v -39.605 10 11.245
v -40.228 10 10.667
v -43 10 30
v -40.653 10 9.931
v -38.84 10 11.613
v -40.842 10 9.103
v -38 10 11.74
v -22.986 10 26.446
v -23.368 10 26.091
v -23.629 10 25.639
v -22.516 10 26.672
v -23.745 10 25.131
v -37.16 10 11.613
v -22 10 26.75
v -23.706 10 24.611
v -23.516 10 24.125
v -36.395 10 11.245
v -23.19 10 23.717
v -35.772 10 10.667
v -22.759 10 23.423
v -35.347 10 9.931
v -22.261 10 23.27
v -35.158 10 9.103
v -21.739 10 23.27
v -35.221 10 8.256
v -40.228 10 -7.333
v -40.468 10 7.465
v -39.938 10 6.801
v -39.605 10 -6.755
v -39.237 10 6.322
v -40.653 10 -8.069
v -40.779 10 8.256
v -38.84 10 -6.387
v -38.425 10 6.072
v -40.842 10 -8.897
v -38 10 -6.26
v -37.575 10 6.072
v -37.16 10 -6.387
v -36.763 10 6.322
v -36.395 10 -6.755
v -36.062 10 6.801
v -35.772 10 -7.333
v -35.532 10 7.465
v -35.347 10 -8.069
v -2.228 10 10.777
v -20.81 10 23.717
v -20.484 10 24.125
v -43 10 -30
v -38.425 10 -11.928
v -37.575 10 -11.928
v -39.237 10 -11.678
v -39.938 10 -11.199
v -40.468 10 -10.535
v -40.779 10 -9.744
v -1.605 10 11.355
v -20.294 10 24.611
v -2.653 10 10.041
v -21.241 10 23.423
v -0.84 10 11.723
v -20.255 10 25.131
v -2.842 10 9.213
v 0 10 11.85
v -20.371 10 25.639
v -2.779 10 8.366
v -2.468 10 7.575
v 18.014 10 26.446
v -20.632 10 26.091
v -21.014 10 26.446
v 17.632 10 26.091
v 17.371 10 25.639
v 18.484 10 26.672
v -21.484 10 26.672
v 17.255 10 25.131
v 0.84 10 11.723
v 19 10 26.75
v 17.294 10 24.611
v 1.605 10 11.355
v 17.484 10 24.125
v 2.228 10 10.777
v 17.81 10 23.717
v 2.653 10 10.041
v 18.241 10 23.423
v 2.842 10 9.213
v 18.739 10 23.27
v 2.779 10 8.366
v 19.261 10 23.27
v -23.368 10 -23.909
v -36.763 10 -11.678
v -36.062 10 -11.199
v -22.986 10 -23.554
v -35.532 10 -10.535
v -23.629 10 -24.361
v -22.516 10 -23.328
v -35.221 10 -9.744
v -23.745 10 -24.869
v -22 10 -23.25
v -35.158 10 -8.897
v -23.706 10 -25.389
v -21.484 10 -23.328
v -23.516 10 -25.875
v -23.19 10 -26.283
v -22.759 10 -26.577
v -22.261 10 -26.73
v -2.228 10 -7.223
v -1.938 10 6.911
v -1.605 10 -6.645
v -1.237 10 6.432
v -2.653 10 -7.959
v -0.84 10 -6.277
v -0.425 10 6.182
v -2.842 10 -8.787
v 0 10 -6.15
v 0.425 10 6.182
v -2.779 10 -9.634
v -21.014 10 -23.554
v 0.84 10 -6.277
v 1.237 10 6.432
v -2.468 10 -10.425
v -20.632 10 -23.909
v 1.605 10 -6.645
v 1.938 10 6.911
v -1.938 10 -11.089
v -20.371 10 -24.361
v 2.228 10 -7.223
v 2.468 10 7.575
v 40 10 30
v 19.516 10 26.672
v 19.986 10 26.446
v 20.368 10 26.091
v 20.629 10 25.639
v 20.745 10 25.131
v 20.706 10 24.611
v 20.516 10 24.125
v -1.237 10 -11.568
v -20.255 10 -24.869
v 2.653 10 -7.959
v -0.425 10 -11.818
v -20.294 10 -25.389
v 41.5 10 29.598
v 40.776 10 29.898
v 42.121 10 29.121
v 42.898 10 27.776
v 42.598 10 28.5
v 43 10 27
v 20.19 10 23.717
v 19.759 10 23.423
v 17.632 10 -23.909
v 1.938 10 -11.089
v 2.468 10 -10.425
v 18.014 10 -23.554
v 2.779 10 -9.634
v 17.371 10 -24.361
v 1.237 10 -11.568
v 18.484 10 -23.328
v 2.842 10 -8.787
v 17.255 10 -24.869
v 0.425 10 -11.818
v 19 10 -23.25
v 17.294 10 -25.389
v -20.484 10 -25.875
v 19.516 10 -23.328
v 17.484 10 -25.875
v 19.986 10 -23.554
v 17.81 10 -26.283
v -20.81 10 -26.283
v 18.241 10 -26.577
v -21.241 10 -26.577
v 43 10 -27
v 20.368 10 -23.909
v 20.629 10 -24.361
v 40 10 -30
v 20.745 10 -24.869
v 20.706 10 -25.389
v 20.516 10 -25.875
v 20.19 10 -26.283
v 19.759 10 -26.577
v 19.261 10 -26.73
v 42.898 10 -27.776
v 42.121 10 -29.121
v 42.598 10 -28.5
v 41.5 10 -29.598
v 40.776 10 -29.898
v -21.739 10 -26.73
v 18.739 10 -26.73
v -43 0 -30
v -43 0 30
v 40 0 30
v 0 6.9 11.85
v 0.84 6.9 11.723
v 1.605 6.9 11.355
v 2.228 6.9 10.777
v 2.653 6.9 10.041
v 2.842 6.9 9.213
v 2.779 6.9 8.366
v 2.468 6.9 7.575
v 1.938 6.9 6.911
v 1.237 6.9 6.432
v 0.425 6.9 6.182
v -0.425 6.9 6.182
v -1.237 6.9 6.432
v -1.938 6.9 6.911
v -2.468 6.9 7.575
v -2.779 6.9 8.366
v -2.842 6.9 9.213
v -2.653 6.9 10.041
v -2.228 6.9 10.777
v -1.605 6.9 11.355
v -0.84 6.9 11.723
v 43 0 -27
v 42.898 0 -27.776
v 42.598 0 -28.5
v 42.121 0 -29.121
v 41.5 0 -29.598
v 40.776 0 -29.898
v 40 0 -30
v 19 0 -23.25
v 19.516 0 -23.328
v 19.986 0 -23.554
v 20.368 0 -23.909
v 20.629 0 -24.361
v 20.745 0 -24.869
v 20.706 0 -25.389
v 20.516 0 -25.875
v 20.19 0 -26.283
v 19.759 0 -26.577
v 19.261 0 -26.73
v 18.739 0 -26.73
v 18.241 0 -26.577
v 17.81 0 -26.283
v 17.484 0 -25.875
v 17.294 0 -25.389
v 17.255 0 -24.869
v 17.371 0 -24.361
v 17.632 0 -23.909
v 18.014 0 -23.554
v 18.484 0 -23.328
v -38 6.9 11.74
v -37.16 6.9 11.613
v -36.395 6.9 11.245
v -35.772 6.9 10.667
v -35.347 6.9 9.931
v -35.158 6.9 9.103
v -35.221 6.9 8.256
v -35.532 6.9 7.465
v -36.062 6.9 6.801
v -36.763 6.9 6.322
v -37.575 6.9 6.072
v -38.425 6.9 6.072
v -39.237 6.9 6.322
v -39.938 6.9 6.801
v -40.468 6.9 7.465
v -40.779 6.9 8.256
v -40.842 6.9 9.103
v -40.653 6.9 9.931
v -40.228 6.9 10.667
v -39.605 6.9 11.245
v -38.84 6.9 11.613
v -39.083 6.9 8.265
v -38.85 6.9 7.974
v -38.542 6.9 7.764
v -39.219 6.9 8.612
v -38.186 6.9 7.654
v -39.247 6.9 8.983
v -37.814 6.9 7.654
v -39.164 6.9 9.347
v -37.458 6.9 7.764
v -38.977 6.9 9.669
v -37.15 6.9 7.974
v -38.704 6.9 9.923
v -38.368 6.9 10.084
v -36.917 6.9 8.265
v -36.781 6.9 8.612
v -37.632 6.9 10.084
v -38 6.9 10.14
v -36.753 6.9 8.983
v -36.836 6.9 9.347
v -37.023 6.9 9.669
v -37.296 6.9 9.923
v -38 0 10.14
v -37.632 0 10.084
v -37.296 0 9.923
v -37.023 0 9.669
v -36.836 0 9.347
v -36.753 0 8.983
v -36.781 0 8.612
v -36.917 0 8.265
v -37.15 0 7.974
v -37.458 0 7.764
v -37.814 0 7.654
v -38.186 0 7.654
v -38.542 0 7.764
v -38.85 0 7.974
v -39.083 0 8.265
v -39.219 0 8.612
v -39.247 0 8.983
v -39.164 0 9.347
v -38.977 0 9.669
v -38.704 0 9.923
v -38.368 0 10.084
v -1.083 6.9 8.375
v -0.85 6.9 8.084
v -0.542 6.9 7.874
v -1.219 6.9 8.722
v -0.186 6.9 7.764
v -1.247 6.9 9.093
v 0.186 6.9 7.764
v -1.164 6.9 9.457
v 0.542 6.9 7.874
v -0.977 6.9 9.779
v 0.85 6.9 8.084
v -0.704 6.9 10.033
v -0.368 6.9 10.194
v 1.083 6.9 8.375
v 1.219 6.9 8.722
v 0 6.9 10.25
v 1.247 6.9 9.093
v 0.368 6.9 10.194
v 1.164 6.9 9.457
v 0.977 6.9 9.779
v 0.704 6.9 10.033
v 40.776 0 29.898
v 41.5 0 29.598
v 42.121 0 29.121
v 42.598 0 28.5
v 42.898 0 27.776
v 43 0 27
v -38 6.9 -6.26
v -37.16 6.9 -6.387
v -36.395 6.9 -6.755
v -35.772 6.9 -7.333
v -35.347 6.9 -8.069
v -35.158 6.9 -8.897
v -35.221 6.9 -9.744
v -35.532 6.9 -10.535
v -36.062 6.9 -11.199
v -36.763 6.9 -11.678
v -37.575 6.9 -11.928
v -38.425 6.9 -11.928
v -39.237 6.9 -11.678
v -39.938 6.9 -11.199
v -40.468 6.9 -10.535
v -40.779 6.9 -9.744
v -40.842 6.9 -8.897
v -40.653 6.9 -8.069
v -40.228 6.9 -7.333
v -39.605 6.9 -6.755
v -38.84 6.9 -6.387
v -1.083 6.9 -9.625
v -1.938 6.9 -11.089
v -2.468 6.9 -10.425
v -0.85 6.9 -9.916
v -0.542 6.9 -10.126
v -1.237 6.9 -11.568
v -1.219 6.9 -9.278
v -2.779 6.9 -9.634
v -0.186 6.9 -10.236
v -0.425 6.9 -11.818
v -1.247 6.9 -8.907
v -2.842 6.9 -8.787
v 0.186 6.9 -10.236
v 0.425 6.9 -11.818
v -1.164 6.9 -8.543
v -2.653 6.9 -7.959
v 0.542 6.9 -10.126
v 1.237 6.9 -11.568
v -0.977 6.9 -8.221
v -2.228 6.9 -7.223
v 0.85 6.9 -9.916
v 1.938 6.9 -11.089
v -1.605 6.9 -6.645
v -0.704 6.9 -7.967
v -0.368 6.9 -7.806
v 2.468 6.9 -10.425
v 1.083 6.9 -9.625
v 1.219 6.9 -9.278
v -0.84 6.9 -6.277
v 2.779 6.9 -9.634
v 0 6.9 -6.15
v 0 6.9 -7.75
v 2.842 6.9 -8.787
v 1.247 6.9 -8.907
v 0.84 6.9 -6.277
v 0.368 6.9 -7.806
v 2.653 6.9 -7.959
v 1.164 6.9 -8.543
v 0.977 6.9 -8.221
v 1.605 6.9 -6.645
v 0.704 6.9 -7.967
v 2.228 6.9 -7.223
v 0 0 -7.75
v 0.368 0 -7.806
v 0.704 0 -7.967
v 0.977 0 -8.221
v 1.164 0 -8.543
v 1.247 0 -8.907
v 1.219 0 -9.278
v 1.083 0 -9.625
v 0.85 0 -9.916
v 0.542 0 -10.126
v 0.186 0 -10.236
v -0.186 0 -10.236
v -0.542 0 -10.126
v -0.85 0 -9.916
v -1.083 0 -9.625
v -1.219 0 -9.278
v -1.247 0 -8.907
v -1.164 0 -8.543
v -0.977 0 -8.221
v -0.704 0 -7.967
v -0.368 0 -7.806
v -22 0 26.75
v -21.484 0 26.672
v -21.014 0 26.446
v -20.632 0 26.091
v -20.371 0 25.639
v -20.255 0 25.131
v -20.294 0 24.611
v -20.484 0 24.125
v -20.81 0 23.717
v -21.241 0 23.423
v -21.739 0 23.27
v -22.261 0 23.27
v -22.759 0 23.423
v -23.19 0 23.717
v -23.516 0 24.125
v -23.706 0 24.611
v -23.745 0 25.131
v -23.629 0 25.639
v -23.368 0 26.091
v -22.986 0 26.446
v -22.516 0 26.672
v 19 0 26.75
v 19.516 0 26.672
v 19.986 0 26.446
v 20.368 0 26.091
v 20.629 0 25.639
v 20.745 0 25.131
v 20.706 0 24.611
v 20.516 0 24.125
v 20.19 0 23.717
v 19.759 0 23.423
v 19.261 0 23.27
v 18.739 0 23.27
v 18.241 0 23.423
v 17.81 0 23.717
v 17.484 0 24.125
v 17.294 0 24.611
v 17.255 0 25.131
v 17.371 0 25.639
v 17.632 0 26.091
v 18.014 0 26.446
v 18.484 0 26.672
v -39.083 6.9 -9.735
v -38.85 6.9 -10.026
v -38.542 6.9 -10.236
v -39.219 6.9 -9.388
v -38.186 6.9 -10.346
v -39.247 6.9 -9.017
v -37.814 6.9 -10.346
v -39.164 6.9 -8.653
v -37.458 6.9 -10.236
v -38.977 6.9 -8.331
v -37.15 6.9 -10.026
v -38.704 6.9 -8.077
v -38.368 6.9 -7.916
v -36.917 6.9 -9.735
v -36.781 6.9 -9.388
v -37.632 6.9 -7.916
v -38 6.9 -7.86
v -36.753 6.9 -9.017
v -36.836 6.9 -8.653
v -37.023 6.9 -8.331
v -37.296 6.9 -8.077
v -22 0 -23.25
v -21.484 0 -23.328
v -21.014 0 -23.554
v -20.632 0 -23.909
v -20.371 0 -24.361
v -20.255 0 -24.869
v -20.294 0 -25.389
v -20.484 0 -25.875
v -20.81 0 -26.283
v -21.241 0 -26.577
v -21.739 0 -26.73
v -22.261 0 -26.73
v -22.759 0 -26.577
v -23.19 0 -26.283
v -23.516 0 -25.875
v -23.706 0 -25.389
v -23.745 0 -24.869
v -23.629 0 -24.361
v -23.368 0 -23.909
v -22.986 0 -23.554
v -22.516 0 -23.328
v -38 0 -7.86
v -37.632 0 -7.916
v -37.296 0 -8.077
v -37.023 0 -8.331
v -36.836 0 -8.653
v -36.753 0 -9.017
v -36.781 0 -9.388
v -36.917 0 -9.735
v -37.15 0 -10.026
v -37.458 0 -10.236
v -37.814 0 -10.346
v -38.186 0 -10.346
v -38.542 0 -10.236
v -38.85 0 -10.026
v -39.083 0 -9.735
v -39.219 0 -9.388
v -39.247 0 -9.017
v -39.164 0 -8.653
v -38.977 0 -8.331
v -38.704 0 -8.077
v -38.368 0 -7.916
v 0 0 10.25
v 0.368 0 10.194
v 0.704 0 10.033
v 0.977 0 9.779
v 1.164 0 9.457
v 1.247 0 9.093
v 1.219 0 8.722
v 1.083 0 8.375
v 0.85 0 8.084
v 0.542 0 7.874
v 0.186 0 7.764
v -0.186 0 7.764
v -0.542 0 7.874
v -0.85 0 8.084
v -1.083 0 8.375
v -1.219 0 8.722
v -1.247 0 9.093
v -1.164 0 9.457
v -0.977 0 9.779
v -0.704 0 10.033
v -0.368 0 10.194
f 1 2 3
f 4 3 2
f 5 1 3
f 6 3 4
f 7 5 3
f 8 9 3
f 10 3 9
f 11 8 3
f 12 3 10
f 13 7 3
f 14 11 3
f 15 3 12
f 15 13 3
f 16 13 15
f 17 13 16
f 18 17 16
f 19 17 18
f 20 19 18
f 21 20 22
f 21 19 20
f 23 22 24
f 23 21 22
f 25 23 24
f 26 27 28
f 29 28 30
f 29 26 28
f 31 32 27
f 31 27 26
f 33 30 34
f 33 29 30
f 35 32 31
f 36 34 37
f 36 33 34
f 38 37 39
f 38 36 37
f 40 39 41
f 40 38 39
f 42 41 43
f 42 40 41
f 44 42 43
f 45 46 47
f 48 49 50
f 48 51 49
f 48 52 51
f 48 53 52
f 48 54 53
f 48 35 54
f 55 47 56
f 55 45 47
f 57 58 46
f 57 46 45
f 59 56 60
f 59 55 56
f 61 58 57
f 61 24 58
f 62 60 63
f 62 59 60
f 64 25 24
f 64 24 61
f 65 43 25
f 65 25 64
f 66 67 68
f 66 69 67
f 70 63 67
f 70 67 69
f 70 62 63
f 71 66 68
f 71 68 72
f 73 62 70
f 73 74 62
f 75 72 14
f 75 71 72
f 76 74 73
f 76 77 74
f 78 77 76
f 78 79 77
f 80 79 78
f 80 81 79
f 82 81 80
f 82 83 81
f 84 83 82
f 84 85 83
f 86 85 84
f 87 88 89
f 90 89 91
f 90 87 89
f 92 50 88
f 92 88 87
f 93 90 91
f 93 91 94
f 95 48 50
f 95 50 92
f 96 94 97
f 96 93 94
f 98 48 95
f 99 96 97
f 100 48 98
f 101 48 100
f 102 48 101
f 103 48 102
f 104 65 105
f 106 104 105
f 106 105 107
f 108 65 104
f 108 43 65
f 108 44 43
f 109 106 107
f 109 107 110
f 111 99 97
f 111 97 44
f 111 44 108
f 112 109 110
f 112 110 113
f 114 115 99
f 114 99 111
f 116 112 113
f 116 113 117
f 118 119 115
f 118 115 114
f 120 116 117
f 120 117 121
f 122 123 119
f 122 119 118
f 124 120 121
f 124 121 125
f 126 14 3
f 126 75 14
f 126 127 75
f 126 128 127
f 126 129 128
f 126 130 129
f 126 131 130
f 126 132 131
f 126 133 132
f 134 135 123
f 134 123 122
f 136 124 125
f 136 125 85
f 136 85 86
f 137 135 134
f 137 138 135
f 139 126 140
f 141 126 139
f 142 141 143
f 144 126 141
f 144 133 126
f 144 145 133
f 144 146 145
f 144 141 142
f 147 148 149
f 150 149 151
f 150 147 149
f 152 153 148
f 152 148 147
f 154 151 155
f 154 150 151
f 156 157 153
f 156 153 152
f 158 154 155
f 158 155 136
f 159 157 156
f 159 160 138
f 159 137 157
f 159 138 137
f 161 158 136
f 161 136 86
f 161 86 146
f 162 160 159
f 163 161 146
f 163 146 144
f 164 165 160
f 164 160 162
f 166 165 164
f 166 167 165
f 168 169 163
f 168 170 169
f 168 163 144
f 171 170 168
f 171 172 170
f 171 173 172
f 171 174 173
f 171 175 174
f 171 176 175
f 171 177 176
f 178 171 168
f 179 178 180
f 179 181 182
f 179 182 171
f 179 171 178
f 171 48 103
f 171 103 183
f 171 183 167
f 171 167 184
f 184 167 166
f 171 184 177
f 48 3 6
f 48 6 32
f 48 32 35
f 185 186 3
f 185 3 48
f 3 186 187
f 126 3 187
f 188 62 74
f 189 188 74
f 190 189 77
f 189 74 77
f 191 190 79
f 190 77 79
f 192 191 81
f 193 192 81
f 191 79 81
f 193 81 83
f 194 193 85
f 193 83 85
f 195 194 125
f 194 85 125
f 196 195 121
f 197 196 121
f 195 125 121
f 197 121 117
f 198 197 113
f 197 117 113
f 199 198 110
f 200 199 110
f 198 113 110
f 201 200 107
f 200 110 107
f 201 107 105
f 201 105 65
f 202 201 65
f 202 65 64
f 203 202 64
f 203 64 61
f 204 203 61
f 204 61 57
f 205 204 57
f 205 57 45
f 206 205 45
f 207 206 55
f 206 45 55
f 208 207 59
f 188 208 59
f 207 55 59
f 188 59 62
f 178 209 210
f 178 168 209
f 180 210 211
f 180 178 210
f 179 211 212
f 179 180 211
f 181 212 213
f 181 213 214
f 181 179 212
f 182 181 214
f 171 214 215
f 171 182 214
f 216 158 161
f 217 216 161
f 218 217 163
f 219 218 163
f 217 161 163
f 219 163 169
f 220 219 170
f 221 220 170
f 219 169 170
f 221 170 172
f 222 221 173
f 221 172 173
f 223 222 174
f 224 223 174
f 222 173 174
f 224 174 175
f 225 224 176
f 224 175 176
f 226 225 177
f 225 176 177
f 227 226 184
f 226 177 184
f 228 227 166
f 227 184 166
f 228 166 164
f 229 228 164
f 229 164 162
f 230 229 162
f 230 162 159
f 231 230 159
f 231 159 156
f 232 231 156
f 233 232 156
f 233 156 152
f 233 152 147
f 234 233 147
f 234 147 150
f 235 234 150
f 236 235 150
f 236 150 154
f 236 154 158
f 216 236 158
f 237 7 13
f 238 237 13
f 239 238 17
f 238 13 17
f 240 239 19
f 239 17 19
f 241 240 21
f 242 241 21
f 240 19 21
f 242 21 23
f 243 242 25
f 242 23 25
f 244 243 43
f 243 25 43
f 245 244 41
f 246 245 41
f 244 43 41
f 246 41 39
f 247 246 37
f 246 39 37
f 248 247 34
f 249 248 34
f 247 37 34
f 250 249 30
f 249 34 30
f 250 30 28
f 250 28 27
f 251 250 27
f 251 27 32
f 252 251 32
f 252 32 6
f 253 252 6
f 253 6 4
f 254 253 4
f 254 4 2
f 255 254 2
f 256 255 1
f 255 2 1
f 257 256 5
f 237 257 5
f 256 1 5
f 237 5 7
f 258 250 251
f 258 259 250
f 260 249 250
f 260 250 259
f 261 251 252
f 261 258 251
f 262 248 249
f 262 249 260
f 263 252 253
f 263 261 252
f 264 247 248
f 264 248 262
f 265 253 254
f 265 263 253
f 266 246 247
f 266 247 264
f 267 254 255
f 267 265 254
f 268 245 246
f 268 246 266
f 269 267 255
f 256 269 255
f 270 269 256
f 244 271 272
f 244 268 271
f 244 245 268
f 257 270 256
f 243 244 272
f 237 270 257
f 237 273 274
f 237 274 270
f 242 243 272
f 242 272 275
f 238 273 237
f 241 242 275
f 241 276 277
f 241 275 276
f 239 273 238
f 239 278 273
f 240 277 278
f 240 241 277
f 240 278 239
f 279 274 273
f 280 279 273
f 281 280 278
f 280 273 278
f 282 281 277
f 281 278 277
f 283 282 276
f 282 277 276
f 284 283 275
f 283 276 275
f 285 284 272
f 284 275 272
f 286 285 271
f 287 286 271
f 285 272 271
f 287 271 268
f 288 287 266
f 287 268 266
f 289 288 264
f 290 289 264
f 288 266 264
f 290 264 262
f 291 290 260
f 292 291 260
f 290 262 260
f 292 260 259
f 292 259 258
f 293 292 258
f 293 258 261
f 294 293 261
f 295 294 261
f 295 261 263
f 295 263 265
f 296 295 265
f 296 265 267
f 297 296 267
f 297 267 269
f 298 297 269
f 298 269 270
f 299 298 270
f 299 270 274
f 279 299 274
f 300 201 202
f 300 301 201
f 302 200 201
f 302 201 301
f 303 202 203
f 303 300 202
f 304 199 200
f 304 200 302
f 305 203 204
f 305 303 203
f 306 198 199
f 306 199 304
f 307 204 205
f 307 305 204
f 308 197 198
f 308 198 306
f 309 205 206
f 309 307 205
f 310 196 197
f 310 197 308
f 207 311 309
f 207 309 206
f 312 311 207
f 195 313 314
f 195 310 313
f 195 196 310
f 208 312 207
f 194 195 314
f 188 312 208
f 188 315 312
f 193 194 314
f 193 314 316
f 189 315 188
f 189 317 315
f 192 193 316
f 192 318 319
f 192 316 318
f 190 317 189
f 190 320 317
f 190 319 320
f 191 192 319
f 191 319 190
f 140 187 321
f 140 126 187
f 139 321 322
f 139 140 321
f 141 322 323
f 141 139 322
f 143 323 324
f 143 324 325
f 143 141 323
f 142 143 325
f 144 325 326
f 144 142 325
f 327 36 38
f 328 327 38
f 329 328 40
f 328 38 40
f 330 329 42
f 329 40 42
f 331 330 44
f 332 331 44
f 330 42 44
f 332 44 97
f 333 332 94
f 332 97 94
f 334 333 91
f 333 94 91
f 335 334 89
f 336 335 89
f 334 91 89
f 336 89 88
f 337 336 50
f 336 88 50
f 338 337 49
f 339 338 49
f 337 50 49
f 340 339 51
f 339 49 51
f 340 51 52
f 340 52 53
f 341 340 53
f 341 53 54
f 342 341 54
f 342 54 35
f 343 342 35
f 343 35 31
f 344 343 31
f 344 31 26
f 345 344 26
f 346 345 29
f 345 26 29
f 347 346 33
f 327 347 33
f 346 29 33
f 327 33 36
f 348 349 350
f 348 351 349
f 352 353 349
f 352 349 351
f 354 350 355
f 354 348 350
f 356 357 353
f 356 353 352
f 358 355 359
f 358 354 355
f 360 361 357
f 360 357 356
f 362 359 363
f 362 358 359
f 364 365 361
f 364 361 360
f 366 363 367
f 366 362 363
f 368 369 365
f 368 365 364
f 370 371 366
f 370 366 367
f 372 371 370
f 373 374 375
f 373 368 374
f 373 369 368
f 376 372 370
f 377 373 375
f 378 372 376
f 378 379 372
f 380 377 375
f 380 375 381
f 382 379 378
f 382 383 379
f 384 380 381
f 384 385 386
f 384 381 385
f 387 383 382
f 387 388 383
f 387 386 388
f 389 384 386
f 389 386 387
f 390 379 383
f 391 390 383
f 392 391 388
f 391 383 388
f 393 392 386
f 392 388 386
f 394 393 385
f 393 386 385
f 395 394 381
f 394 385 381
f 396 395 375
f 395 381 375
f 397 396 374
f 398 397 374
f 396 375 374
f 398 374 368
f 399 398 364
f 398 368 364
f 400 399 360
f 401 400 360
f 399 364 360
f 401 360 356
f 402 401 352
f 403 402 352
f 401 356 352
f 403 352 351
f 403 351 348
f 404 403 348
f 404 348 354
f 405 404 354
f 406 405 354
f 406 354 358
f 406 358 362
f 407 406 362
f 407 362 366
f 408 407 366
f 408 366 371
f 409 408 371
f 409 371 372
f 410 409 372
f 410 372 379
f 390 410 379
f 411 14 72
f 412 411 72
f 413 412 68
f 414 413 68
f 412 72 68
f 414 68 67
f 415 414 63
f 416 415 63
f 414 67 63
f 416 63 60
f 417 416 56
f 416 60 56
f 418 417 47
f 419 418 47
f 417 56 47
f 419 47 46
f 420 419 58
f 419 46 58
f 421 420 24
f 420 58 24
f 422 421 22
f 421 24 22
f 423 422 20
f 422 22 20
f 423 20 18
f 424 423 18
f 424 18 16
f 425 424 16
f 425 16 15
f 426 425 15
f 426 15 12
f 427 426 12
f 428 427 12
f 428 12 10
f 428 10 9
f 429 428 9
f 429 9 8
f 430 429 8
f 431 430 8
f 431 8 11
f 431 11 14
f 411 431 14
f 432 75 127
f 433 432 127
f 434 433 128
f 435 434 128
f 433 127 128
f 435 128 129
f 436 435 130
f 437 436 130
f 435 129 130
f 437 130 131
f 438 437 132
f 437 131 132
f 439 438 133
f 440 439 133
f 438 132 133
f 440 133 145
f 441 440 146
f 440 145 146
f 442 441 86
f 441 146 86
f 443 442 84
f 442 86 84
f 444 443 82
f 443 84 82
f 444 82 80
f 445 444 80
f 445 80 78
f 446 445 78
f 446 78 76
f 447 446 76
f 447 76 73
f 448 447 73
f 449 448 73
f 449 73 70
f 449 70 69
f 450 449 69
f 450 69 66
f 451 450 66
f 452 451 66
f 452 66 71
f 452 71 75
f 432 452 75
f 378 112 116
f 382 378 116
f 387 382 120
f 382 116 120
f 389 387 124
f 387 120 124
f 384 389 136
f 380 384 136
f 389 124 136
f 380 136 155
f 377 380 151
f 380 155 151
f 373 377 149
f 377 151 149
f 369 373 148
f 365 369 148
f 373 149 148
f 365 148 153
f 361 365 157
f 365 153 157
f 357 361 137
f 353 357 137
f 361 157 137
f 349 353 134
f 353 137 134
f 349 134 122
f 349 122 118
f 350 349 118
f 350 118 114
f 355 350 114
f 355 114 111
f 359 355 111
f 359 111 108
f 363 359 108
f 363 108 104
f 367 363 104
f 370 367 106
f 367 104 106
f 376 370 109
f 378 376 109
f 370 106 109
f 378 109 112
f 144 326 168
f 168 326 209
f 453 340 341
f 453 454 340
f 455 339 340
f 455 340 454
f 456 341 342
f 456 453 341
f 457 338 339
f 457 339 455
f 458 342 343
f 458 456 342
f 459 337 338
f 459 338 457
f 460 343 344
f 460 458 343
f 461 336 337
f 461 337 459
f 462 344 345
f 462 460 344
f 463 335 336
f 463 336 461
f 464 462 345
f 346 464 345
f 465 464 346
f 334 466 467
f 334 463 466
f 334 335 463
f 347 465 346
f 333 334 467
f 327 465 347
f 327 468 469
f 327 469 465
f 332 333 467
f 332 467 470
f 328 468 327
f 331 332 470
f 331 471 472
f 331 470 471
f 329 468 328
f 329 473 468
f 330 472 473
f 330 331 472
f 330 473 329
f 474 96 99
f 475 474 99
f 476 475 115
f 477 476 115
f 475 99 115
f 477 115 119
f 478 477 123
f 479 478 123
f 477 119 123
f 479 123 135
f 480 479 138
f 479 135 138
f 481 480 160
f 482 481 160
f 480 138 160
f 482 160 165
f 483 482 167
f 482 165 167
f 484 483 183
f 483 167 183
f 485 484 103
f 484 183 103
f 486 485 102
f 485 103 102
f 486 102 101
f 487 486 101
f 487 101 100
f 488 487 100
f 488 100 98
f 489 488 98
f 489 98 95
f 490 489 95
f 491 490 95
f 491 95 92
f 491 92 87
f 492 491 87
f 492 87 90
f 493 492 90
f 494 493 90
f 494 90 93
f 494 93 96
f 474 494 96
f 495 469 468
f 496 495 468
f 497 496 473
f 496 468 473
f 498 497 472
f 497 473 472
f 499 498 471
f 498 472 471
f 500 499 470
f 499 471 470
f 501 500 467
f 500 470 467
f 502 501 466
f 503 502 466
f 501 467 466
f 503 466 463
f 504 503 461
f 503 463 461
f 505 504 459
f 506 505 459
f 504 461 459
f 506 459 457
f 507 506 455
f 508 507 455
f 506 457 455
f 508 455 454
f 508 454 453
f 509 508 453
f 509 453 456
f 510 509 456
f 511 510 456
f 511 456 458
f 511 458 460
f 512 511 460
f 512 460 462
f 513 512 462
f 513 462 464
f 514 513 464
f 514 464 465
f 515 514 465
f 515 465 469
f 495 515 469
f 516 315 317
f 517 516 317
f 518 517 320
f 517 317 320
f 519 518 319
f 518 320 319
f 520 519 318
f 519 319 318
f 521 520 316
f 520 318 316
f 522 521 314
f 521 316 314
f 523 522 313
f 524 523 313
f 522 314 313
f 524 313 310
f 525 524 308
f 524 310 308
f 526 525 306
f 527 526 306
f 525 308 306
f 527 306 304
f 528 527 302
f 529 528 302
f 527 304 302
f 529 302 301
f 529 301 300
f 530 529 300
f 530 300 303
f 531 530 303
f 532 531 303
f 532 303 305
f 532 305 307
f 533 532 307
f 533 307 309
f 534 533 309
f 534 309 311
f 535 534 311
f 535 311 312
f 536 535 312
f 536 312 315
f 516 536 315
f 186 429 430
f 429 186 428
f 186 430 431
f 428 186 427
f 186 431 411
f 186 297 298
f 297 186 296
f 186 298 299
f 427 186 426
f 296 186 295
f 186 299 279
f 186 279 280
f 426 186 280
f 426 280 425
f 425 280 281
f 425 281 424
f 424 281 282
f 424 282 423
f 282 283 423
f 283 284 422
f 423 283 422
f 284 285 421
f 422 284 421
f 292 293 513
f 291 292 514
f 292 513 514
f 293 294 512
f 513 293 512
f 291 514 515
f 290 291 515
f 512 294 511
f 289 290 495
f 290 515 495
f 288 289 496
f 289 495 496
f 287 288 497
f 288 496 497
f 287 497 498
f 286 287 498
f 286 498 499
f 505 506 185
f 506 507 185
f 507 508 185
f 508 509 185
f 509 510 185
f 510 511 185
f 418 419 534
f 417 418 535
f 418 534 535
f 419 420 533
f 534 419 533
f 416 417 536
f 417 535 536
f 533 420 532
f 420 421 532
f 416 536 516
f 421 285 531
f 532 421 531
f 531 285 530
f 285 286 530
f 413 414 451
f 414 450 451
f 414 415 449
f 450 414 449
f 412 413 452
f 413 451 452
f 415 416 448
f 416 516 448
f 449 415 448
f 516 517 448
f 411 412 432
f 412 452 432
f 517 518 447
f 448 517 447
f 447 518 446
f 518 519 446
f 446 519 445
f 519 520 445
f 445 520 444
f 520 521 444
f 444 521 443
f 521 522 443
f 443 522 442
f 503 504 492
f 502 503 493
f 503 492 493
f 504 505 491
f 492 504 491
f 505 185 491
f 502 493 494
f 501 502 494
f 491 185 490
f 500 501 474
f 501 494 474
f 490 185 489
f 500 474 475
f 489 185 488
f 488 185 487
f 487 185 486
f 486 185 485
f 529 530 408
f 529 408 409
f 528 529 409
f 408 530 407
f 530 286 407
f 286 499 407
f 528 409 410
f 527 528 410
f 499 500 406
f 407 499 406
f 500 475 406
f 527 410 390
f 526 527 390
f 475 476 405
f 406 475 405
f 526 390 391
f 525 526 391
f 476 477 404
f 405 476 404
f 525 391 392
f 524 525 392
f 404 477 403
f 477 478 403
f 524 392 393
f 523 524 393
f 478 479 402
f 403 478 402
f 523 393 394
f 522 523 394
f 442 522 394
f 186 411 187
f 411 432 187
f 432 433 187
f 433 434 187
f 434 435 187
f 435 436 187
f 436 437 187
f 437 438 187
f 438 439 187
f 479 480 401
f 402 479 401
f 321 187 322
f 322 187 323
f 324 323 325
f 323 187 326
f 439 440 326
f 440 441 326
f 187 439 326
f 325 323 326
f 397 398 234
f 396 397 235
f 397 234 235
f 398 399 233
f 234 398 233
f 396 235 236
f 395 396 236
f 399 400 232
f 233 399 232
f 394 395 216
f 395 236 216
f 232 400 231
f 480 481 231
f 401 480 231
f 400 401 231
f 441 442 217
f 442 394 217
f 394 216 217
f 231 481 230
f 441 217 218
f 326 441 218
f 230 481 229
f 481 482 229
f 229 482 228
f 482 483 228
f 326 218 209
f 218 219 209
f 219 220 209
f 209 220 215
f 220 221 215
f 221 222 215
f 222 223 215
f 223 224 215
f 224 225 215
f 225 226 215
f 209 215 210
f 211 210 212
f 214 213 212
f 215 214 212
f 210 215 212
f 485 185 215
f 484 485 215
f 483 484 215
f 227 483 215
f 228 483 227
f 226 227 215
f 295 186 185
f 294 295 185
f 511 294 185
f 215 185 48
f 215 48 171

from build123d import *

# Parameters (mm, degrees)
SKETCH_1_W          = 86
SKETCH_1_H          = 60
EXTRUDE_1_DEPTH     = 10
FILLET_1_R          = 3
SKETCH_2_R          = 1.25
CUT_EXTRUDE_1_DEPTH = 54.37602458
SKETCH_3_R          = 2.85
CUT_EXTRUDE_2_DEPTH = 3.1
SKETCH_4_R          = 1.75
CUT_EXTRUDE_3_DEPTH = 54.37602458


with BuildPart() as part:
    # 草图1 → 凸台-拉伸1 (new body)
    with BuildSketch(Plane(origin=(0, 0, 0), x_dir=(1, 0, 0), z_dir=(0, 1, 0))):
        Rectangle(SKETCH_1_W, SKETCH_1_H)
    extrude(amount=EXTRUDE_1_DEPTH)

    # 圆角1
    fillet_1_edges = [part.edges().sort_by_distance(p)[0] for p in [
        (43, 5, 30),
        (43, 5, -30),
    ]]
    fillet(fillet_1_edges, radius=FILLET_1_R)

    # 草图2 → 切除-拉伸1 (cut, through all)
    with BuildSketch(Plane(origin=(0, 10, 0), x_dir=(1, 0, 0), z_dir=(0, 1, 0))):
        with Locations(Location((-38, -8.88983487, 0), (0, 0, 270))):
            Circle(SKETCH_2_R)
        with Locations(Location((-38, 9.11016513, 0), (0, 0, 270))):
            Circle(SKETCH_2_R)
        with Locations(Location((0, 9, 0), (0, 0, 270))):
            Circle(SKETCH_2_R)
        with Locations(Location((0, -9, 0), (0, 0, 270))):
            Circle(SKETCH_2_R)
    extrude(amount=-CUT_EXTRUDE_1_DEPTH, mode=Mode.SUBTRACT)

    # 草图3 → 切除-拉伸2 (cut)
    with BuildSketch(Plane(origin=(0, 10, 0), x_dir=(1, 0, 0), z_dir=(0, 1, 0))):
        with Locations(Location((-38, -8.88983487, 0), (0, 0, 270))):
            Circle(SKETCH_3_R)
        with Locations(Location((-38, 9.11016513, 0), (0, 0, 270))):
            Circle(SKETCH_3_R)
        with Locations(Location((0, -9, 0), (0, 0, 270))):
            Circle(SKETCH_3_R)
        with Locations(Location((0, 9, 0), (0, 0, 270))):
            Circle(SKETCH_3_R)
    extrude(amount=-CUT_EXTRUDE_2_DEPTH, mode=Mode.SUBTRACT)

    # 草图4 → 切除-拉伸3 (cut, through all)
    with BuildSketch(Plane(origin=(0, 10, 0), x_dir=(1, 0, 0), z_dir=(0, 1, 0))):
        with Locations(Location((-22, -25, 0), (0, 0, 270))):
            Circle(SKETCH_4_R)
        with Locations(Location((-22, 25, 0), (0, 0, 270))):
            Circle(SKETCH_4_R)
        with Locations(Location((19, -25, 0), (0, 0, 270))):
            Circle(SKETCH_4_R)
        with Locations(Location((19, 25, 0), (0, 0, 270))):
            Circle(SKETCH_4_R)
    extrude(amount=-CUT_EXTRUDE_3_DEPTH, mode=Mode.SUBTRACT)


solid = part.part
